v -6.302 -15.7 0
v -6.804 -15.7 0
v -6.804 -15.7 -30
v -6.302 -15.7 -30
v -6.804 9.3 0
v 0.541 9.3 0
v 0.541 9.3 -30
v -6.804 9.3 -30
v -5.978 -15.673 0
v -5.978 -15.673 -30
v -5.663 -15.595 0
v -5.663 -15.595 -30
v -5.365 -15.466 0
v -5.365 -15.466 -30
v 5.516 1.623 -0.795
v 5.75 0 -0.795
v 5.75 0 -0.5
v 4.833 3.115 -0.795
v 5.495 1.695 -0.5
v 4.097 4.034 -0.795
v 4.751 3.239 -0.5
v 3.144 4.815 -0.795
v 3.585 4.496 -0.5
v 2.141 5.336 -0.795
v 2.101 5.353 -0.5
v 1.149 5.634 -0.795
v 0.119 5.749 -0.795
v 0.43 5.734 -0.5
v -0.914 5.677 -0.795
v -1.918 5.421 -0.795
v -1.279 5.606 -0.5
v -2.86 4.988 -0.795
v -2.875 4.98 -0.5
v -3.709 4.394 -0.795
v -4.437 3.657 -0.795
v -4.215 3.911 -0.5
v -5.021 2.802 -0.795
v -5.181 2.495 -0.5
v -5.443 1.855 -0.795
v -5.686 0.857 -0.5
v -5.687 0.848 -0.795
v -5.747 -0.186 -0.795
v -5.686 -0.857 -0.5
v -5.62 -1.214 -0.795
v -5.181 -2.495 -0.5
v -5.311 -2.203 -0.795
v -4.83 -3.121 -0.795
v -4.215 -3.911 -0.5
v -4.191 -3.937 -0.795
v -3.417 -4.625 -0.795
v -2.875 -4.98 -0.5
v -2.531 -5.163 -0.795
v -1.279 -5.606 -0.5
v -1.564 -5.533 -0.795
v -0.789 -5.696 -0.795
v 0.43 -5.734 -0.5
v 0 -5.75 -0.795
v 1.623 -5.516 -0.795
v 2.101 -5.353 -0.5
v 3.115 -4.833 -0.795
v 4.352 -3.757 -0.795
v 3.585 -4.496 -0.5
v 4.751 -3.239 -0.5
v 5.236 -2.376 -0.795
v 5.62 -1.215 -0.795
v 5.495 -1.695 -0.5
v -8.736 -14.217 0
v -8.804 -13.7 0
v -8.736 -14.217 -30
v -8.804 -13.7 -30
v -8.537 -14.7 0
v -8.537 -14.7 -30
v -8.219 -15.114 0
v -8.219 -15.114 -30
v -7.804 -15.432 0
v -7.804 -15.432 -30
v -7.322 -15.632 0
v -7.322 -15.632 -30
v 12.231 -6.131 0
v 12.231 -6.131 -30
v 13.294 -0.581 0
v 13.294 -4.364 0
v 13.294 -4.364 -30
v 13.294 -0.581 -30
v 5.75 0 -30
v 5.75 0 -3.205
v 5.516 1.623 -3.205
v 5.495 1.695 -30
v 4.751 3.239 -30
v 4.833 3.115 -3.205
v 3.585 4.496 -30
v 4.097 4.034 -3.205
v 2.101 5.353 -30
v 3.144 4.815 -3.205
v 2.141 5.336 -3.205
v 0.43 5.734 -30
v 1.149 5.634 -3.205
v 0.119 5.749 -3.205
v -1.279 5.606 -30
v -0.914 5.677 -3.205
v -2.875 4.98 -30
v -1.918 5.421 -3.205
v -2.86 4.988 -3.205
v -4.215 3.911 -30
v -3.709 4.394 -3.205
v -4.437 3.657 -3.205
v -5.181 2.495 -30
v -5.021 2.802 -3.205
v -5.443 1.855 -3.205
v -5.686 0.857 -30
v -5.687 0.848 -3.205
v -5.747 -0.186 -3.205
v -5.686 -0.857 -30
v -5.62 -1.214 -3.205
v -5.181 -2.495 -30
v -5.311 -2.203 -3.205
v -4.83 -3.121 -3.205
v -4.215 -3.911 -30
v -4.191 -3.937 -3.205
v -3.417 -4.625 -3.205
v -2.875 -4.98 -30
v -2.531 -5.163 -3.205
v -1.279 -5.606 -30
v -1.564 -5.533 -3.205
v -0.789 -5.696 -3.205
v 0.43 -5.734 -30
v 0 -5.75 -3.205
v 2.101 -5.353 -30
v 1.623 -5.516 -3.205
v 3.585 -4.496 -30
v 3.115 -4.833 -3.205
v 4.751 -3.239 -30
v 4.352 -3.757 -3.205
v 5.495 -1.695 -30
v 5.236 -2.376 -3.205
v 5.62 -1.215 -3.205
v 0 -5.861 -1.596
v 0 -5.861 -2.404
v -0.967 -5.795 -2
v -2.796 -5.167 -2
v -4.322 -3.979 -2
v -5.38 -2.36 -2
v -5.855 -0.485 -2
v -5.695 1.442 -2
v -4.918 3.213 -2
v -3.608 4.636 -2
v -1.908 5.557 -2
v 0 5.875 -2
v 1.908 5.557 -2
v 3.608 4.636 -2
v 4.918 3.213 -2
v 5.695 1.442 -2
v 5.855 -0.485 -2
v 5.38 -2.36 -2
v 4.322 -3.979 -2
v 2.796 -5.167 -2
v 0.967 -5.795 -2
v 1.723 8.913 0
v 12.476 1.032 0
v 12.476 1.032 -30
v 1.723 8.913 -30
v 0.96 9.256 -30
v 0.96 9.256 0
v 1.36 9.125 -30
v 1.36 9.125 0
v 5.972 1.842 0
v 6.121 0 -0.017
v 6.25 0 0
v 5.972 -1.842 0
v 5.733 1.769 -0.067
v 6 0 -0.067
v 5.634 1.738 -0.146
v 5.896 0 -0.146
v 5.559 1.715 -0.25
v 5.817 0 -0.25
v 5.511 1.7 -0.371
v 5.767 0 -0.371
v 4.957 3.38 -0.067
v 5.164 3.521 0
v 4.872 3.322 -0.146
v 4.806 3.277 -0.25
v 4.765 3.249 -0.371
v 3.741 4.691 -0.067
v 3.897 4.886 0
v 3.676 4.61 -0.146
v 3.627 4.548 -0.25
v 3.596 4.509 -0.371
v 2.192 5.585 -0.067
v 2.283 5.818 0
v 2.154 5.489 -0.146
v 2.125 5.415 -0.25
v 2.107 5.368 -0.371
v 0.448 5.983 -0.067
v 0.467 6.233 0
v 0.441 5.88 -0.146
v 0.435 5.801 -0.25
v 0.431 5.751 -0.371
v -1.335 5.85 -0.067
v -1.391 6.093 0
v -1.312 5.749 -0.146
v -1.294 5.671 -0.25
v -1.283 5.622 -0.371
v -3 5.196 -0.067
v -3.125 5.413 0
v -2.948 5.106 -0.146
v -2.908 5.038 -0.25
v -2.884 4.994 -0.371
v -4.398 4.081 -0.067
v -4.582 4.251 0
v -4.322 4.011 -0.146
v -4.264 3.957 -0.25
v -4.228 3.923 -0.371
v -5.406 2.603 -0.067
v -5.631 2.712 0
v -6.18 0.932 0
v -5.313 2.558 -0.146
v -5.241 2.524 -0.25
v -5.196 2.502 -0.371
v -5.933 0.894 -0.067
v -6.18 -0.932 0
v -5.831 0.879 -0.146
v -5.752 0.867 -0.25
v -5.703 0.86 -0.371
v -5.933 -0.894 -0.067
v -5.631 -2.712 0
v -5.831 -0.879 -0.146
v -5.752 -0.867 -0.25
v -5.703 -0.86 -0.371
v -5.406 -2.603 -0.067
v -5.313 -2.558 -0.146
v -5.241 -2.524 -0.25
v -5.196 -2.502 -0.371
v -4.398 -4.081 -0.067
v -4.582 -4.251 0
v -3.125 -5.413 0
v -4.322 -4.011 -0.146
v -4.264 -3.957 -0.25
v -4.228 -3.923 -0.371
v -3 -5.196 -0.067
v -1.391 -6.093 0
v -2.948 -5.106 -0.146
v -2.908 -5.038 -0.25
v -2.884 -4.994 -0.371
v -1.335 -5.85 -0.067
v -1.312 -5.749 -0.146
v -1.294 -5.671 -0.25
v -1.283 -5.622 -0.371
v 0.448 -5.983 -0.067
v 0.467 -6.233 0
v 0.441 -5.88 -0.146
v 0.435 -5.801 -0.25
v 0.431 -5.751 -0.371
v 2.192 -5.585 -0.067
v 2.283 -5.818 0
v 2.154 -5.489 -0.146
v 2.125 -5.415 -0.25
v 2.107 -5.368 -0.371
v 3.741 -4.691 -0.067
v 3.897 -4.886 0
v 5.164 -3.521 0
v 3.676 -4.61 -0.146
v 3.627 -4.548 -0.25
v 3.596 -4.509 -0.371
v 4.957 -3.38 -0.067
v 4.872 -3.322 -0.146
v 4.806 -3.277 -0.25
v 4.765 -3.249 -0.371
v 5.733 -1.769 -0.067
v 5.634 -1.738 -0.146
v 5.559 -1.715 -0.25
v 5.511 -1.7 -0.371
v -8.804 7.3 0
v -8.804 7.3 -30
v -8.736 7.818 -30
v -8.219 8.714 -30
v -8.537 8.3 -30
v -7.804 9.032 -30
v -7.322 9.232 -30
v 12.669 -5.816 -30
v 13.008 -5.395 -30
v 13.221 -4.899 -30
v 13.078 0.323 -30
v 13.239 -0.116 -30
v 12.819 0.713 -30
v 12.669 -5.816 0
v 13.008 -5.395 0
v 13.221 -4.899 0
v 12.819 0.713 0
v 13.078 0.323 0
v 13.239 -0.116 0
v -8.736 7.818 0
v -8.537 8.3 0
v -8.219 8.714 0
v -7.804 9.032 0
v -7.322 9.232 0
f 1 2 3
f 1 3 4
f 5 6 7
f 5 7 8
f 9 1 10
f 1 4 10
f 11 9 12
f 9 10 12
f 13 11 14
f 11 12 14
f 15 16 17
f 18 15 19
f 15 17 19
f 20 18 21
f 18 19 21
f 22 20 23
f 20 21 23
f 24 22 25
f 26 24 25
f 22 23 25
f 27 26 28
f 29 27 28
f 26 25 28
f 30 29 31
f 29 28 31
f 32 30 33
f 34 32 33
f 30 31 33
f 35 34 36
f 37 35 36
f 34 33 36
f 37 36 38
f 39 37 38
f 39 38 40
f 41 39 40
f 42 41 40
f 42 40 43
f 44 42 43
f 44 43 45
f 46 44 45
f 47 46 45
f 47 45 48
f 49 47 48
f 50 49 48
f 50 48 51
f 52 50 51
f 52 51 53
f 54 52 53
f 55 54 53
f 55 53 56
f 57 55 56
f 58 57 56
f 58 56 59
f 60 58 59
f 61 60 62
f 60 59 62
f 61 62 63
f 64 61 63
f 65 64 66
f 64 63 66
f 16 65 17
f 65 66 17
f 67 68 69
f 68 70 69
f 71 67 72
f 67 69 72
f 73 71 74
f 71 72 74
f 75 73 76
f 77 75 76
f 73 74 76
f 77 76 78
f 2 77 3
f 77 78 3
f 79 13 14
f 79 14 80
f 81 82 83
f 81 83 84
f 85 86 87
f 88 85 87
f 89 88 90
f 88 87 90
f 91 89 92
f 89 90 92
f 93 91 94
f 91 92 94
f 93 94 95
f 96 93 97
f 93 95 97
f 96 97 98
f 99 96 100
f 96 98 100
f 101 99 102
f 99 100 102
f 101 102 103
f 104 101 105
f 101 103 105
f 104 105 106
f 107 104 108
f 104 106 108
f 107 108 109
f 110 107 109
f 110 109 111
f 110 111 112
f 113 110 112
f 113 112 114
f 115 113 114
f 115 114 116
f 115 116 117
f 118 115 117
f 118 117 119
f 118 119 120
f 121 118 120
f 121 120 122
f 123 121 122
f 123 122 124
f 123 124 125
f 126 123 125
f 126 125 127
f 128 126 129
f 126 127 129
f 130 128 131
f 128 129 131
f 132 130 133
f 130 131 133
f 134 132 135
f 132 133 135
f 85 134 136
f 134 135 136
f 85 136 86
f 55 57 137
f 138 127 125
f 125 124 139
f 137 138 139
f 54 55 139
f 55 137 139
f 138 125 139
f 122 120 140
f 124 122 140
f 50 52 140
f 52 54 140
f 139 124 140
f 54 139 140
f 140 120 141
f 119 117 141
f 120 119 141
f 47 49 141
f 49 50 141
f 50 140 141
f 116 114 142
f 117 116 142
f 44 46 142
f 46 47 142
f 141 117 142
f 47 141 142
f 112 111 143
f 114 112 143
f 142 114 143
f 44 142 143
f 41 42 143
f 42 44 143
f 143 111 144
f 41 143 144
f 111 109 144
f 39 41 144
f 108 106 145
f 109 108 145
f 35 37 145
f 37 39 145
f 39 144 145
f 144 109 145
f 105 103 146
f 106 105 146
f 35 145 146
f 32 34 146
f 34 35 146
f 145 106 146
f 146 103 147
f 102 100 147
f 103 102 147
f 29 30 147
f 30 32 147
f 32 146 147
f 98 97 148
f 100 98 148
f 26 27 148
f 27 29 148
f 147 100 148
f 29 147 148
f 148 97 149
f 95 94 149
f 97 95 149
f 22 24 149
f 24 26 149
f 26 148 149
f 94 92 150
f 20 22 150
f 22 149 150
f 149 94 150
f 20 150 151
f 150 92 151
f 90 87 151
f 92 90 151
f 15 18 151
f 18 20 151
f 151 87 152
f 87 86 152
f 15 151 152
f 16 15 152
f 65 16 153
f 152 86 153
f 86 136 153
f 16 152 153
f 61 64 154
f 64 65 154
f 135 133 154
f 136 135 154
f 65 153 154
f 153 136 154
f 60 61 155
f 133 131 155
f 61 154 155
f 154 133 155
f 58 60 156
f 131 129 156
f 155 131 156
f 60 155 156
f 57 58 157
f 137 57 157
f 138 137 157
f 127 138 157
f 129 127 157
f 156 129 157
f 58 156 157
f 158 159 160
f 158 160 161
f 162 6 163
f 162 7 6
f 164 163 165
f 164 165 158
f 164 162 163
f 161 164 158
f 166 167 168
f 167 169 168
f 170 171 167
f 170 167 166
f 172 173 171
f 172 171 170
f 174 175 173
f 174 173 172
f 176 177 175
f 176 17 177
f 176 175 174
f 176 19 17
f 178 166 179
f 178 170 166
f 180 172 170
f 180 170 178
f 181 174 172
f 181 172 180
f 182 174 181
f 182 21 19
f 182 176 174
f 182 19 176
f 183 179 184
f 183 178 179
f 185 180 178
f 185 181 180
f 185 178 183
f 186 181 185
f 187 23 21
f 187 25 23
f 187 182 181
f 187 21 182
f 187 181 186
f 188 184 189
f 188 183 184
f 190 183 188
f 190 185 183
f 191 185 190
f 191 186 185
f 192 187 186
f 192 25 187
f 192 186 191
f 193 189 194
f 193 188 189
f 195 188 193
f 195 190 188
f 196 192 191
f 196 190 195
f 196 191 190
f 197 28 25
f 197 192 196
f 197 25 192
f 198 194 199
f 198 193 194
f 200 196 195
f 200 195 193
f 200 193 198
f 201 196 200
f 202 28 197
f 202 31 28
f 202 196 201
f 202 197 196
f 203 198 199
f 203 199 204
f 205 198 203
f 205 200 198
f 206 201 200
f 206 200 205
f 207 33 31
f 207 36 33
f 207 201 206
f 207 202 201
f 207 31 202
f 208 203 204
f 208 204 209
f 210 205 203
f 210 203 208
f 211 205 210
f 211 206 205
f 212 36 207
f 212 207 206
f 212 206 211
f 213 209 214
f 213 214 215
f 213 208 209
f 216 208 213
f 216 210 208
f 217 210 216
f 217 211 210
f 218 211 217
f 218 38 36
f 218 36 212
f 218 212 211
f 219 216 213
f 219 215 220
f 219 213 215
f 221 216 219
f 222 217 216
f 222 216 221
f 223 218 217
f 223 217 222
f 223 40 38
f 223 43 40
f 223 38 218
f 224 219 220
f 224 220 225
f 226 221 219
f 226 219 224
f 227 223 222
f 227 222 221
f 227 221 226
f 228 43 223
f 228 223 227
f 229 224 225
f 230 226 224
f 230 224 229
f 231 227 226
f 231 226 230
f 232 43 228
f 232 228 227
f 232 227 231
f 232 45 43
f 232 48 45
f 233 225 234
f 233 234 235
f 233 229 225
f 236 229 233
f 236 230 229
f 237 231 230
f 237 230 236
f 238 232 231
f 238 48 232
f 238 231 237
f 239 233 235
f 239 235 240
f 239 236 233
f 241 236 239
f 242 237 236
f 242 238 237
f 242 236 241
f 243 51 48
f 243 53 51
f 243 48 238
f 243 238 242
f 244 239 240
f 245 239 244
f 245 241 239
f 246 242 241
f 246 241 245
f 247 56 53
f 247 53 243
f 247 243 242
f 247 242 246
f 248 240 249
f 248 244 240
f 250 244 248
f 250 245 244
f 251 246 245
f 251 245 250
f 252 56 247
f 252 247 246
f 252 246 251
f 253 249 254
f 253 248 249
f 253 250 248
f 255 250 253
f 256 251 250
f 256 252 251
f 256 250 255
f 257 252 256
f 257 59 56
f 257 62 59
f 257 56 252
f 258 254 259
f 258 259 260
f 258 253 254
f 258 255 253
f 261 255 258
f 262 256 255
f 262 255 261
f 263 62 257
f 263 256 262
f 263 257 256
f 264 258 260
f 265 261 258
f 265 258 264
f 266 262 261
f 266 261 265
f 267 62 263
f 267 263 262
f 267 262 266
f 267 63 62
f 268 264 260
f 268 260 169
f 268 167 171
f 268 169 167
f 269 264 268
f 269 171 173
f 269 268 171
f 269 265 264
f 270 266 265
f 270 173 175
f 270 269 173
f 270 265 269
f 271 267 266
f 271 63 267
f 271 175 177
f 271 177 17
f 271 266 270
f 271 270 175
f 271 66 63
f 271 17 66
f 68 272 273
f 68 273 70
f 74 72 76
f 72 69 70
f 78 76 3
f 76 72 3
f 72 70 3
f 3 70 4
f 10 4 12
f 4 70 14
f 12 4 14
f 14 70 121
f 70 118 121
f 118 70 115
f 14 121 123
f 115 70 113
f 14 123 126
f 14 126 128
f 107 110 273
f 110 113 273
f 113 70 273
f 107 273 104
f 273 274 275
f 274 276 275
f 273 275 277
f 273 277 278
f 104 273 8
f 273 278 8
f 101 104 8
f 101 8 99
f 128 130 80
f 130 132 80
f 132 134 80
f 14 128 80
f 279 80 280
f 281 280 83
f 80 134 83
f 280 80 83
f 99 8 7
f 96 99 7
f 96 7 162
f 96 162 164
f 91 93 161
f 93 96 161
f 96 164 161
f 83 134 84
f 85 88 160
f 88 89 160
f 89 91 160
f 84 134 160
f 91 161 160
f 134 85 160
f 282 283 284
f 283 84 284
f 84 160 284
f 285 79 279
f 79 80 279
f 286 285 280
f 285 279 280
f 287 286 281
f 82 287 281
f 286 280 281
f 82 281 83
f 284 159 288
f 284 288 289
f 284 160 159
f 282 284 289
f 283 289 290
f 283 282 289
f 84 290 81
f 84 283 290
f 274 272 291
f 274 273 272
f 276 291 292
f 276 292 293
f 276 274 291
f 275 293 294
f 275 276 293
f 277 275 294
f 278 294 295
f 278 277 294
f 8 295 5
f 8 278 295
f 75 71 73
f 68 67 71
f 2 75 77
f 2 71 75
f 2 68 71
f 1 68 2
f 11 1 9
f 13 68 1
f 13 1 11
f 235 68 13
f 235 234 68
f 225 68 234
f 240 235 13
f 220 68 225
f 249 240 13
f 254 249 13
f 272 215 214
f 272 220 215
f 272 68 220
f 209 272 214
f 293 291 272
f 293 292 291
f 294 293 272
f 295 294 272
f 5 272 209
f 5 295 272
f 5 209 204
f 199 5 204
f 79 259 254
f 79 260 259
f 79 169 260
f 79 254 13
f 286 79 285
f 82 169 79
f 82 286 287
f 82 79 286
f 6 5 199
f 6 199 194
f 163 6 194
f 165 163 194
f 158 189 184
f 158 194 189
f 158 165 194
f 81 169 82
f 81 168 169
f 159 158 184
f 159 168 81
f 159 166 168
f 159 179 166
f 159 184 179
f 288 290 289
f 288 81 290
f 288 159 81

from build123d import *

# Parameters (mm, degrees)
F0_R     = 5.75
F1_DEPTH = 30
F2_R     = 2
F5_R     = 0.5


with BuildPart() as f1:
    # F0 (on Top) → F1 (new body)
    with BuildSketch(Plane.XY):
        Polygon((-8.8044720603, 9.3002779725), (-8.8044720603, -15.6997220275), (-5.8044720603, -15.6997220275), (13.2937646807, -5.5672283149), (13.2937646807, 0.4327716851), (1.1955279397, 9.3002779725), align=None)
        Circle(F0_R, mode=Mode.SUBTRACT)
    extrude(amount=-F1_DEPTH)

    # F2
    f2_edges = [f1.edges().sort_by_distance(p)[0] for p in [
        (-8.804472, 9.300278, -15),
        (1.195528, 9.300278, -15),
        (-8.804472, -15.699722, -15),
        (13.293765, -5.567228, -15),
        (-5.804472, -15.699722, -15),
        (13.293765, 0.432772, -15),
    ]]
    fillet(f2_edges, radius=F2_R)

    # F3 (on Right) → F4 (revolve, cut)
    with BuildSketch(Plane.YZ):
        with BuildLine():
            Line((0, 0), (-5.5240949485, 0))
            ThreePointArc((-5.5240949485, 0), (-4.8096582519, -5.3738423941), (0, -7.875))
            Line((0, -7.875), (0, 0))
        make_face()
    revolve(axis=Axis((0, 0, -1), (0, 0, -1)), mode=Mode.SUBTRACT)

    # F5
    f5_edges = [f1.edges().sort_by_distance(p)[0] for p in [
        (-5.75, 0, 0),
    ]]
    fillet(f5_edges, radius=F5_R)


solid = f1.part
